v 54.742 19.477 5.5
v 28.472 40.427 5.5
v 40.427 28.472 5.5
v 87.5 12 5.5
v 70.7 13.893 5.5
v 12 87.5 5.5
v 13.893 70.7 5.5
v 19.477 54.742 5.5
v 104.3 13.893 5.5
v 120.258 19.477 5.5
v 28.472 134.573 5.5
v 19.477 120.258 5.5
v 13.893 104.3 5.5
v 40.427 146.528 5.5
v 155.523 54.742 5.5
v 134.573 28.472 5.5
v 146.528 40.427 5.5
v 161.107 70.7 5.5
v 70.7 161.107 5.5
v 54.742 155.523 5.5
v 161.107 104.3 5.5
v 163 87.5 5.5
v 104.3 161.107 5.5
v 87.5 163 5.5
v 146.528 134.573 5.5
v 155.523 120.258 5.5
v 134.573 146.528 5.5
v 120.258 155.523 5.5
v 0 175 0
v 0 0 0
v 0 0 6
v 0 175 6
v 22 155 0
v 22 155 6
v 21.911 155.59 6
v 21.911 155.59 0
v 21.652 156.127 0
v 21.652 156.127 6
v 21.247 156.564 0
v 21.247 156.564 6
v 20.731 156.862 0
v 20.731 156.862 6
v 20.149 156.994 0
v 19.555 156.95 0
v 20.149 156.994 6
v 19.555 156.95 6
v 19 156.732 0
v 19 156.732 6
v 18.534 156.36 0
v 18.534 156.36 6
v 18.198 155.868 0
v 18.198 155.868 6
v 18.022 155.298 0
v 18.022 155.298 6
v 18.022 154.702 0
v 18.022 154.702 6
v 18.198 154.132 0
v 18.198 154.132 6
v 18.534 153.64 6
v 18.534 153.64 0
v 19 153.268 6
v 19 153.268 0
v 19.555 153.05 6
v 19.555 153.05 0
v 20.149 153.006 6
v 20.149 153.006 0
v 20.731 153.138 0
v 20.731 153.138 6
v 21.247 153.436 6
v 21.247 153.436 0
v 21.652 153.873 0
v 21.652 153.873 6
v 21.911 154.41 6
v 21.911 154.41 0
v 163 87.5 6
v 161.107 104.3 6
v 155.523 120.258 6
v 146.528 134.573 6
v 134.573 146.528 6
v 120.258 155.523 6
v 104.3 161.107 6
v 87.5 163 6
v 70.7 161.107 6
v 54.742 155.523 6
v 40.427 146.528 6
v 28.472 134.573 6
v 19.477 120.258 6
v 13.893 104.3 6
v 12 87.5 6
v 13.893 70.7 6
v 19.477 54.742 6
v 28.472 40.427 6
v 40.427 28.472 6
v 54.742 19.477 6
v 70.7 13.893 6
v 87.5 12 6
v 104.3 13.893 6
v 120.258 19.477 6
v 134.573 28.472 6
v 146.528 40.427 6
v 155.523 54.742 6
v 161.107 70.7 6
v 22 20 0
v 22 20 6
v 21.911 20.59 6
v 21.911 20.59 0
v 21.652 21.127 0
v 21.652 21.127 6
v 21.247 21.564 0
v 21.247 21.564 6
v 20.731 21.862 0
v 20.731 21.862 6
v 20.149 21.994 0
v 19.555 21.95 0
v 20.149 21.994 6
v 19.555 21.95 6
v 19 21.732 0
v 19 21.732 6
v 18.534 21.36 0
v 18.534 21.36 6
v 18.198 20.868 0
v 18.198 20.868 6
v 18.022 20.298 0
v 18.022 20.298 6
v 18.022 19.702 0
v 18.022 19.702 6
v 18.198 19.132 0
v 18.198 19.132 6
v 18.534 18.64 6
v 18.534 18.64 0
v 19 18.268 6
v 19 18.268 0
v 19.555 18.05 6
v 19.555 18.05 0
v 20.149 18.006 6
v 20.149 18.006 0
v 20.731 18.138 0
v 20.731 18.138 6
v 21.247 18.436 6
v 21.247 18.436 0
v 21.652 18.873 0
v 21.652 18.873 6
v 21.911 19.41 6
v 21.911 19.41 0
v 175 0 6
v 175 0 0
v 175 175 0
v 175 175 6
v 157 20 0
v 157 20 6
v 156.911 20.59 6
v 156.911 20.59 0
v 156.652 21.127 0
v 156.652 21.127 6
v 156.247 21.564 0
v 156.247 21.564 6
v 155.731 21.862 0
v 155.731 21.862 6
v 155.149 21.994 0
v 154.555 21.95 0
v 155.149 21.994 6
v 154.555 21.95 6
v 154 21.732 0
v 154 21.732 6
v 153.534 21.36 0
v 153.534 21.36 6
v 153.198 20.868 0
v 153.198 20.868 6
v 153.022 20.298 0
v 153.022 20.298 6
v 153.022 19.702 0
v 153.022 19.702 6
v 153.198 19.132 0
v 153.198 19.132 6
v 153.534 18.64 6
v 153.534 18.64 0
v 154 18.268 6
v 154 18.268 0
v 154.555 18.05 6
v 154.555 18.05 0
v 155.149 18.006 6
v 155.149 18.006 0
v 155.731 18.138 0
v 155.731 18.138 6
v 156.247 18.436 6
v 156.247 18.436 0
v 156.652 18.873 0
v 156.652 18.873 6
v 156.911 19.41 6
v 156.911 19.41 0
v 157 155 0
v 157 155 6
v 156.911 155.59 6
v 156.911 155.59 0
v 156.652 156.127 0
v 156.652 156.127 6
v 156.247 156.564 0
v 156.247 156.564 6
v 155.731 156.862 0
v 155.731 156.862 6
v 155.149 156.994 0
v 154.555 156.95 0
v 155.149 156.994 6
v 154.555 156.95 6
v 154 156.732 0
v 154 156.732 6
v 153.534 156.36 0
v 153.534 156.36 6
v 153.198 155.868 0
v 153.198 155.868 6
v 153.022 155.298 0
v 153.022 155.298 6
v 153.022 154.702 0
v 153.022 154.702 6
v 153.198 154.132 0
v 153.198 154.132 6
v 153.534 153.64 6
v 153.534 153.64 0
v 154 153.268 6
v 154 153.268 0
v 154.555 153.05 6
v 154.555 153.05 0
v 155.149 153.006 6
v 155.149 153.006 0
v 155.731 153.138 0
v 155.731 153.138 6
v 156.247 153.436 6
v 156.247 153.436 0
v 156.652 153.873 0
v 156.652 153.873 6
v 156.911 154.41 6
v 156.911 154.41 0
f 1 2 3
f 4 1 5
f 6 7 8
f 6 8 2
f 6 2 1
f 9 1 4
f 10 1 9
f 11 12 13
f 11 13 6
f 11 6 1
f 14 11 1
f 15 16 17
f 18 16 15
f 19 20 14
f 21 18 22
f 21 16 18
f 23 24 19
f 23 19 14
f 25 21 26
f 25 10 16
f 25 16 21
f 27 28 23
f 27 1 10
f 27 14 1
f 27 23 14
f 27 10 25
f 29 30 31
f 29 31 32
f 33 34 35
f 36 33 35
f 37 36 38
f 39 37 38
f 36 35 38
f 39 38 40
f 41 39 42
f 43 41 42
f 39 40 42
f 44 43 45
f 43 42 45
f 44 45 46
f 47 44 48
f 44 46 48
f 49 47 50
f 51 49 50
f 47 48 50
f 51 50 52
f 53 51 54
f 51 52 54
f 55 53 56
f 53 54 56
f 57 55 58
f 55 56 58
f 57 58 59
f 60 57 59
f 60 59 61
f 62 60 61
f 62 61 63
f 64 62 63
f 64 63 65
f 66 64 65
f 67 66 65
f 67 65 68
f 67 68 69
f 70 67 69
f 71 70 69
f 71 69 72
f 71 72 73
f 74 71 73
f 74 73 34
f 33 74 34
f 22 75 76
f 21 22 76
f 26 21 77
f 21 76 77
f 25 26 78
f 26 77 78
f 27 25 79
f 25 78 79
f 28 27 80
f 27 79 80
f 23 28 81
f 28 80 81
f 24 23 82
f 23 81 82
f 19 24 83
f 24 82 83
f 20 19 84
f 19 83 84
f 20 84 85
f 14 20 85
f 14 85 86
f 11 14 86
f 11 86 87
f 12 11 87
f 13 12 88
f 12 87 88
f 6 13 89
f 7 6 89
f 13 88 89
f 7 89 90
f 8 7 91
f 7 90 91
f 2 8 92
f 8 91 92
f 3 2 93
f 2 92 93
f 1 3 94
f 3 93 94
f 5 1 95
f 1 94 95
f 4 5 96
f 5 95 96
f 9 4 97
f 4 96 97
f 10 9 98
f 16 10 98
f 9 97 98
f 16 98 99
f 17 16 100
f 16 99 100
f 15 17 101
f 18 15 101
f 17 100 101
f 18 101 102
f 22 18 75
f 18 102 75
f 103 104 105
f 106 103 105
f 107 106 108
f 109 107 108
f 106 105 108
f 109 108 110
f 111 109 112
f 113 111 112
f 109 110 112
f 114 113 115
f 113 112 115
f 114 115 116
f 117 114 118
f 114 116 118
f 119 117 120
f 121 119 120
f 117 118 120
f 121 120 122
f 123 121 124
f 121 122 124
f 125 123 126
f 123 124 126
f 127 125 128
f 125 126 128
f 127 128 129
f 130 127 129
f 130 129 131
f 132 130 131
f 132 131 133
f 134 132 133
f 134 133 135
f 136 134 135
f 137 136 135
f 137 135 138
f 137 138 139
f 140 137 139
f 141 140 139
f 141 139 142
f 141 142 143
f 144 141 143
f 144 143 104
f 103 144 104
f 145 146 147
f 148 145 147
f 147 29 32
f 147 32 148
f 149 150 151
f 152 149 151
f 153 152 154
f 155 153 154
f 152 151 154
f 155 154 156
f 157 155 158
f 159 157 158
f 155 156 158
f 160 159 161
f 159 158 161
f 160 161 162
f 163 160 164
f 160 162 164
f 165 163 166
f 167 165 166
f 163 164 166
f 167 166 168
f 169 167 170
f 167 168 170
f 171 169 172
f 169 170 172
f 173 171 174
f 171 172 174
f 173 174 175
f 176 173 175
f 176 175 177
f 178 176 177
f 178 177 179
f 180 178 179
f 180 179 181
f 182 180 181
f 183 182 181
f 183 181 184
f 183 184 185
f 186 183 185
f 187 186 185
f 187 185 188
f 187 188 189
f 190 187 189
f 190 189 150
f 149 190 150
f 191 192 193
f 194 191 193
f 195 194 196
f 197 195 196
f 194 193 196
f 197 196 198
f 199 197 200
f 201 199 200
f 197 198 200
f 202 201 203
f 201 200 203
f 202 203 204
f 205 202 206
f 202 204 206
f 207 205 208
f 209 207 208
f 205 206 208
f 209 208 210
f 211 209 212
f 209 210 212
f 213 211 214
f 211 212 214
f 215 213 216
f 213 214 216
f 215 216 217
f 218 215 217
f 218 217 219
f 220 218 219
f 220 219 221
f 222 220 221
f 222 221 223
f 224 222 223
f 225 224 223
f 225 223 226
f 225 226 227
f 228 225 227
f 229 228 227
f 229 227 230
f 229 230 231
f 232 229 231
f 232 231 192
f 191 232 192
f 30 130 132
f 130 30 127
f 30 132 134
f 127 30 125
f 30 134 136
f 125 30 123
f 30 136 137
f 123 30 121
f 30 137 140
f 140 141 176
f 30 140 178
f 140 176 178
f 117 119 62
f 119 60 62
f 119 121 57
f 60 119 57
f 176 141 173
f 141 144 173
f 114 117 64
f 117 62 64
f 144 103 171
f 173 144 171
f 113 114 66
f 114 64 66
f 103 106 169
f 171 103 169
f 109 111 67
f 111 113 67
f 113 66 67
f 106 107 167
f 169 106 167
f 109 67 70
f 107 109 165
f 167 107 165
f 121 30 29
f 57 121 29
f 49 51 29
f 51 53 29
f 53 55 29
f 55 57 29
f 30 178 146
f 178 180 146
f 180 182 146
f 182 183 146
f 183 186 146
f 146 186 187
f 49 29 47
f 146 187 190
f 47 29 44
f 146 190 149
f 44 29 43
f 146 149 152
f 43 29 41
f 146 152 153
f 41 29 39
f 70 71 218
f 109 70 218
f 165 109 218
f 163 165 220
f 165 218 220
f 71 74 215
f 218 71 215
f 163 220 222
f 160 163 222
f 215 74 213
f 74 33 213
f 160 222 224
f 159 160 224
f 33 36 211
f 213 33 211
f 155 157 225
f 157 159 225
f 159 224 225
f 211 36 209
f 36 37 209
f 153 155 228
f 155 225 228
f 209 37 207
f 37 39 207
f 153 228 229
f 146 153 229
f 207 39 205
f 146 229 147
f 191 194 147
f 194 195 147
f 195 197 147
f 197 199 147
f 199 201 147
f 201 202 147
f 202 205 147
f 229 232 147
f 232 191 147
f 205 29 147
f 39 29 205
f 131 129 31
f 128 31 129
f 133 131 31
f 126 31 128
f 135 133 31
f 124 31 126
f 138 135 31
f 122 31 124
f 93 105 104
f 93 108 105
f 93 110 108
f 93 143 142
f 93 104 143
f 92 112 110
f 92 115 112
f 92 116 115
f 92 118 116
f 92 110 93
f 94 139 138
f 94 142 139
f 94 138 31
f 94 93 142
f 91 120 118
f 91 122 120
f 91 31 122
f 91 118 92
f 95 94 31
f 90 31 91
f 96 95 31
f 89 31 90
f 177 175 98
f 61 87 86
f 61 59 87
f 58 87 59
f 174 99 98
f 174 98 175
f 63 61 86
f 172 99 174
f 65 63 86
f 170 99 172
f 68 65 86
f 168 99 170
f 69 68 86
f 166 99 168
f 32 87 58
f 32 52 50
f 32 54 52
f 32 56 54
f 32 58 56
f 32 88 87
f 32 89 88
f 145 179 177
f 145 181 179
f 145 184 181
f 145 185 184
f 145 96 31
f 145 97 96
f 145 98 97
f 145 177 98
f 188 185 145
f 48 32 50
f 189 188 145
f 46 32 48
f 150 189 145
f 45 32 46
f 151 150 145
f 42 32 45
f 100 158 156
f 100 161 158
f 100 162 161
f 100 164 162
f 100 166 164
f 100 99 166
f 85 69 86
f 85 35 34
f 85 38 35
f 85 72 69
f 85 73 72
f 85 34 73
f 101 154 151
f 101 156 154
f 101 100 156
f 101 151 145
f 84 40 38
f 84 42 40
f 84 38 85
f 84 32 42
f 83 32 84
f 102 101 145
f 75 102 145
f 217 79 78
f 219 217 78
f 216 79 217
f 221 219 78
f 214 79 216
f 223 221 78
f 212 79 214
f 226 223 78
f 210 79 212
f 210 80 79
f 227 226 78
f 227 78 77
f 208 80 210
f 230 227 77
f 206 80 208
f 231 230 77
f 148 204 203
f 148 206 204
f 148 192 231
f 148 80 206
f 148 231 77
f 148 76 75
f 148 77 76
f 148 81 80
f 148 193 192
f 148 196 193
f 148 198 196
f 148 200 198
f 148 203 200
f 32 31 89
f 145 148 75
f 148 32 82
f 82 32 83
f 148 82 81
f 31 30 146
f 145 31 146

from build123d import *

# Parameters (mm, degrees)
F0_W     = 175
F0_H     = 175
F1_DEPTH = 6
F2_R     = 75.5
F3_DEPTH = 0.5
F4_R     = 2
F5_DEPTH = 6.001


with BuildPart() as f1:
    # F0 (on Top) → F1 (new body)
    with BuildSketch(Plane.XY):
        with Locations((87.5, 87.5)):
            Rectangle(F0_W, F0_H)
    extrude(amount=F1_DEPTH)

    # F2 (on face) → F3 (cut)
    with BuildSketch(Plane.XY.offset(6)):
        with Locations((87.5, 87.5)):
            Circle(F2_R)
    extrude(amount=-F3_DEPTH, mode=Mode.SUBTRACT)

    # F4 (on face) → F5 (cut, through all)
    with BuildSketch(Plane.XY.offset(6)):
        with Locations((20, 155)):
            Circle(F4_R)
        with Locations((155, 155)):
            Circle(F4_R)
        with Locations((155, 20)):
            Circle(F4_R)
        with Locations((20, 20)):
            Circle(F4_R)
    extrude(amount=-F5_DEPTH, mode=Mode.SUBTRACT)


solid = f1.part
